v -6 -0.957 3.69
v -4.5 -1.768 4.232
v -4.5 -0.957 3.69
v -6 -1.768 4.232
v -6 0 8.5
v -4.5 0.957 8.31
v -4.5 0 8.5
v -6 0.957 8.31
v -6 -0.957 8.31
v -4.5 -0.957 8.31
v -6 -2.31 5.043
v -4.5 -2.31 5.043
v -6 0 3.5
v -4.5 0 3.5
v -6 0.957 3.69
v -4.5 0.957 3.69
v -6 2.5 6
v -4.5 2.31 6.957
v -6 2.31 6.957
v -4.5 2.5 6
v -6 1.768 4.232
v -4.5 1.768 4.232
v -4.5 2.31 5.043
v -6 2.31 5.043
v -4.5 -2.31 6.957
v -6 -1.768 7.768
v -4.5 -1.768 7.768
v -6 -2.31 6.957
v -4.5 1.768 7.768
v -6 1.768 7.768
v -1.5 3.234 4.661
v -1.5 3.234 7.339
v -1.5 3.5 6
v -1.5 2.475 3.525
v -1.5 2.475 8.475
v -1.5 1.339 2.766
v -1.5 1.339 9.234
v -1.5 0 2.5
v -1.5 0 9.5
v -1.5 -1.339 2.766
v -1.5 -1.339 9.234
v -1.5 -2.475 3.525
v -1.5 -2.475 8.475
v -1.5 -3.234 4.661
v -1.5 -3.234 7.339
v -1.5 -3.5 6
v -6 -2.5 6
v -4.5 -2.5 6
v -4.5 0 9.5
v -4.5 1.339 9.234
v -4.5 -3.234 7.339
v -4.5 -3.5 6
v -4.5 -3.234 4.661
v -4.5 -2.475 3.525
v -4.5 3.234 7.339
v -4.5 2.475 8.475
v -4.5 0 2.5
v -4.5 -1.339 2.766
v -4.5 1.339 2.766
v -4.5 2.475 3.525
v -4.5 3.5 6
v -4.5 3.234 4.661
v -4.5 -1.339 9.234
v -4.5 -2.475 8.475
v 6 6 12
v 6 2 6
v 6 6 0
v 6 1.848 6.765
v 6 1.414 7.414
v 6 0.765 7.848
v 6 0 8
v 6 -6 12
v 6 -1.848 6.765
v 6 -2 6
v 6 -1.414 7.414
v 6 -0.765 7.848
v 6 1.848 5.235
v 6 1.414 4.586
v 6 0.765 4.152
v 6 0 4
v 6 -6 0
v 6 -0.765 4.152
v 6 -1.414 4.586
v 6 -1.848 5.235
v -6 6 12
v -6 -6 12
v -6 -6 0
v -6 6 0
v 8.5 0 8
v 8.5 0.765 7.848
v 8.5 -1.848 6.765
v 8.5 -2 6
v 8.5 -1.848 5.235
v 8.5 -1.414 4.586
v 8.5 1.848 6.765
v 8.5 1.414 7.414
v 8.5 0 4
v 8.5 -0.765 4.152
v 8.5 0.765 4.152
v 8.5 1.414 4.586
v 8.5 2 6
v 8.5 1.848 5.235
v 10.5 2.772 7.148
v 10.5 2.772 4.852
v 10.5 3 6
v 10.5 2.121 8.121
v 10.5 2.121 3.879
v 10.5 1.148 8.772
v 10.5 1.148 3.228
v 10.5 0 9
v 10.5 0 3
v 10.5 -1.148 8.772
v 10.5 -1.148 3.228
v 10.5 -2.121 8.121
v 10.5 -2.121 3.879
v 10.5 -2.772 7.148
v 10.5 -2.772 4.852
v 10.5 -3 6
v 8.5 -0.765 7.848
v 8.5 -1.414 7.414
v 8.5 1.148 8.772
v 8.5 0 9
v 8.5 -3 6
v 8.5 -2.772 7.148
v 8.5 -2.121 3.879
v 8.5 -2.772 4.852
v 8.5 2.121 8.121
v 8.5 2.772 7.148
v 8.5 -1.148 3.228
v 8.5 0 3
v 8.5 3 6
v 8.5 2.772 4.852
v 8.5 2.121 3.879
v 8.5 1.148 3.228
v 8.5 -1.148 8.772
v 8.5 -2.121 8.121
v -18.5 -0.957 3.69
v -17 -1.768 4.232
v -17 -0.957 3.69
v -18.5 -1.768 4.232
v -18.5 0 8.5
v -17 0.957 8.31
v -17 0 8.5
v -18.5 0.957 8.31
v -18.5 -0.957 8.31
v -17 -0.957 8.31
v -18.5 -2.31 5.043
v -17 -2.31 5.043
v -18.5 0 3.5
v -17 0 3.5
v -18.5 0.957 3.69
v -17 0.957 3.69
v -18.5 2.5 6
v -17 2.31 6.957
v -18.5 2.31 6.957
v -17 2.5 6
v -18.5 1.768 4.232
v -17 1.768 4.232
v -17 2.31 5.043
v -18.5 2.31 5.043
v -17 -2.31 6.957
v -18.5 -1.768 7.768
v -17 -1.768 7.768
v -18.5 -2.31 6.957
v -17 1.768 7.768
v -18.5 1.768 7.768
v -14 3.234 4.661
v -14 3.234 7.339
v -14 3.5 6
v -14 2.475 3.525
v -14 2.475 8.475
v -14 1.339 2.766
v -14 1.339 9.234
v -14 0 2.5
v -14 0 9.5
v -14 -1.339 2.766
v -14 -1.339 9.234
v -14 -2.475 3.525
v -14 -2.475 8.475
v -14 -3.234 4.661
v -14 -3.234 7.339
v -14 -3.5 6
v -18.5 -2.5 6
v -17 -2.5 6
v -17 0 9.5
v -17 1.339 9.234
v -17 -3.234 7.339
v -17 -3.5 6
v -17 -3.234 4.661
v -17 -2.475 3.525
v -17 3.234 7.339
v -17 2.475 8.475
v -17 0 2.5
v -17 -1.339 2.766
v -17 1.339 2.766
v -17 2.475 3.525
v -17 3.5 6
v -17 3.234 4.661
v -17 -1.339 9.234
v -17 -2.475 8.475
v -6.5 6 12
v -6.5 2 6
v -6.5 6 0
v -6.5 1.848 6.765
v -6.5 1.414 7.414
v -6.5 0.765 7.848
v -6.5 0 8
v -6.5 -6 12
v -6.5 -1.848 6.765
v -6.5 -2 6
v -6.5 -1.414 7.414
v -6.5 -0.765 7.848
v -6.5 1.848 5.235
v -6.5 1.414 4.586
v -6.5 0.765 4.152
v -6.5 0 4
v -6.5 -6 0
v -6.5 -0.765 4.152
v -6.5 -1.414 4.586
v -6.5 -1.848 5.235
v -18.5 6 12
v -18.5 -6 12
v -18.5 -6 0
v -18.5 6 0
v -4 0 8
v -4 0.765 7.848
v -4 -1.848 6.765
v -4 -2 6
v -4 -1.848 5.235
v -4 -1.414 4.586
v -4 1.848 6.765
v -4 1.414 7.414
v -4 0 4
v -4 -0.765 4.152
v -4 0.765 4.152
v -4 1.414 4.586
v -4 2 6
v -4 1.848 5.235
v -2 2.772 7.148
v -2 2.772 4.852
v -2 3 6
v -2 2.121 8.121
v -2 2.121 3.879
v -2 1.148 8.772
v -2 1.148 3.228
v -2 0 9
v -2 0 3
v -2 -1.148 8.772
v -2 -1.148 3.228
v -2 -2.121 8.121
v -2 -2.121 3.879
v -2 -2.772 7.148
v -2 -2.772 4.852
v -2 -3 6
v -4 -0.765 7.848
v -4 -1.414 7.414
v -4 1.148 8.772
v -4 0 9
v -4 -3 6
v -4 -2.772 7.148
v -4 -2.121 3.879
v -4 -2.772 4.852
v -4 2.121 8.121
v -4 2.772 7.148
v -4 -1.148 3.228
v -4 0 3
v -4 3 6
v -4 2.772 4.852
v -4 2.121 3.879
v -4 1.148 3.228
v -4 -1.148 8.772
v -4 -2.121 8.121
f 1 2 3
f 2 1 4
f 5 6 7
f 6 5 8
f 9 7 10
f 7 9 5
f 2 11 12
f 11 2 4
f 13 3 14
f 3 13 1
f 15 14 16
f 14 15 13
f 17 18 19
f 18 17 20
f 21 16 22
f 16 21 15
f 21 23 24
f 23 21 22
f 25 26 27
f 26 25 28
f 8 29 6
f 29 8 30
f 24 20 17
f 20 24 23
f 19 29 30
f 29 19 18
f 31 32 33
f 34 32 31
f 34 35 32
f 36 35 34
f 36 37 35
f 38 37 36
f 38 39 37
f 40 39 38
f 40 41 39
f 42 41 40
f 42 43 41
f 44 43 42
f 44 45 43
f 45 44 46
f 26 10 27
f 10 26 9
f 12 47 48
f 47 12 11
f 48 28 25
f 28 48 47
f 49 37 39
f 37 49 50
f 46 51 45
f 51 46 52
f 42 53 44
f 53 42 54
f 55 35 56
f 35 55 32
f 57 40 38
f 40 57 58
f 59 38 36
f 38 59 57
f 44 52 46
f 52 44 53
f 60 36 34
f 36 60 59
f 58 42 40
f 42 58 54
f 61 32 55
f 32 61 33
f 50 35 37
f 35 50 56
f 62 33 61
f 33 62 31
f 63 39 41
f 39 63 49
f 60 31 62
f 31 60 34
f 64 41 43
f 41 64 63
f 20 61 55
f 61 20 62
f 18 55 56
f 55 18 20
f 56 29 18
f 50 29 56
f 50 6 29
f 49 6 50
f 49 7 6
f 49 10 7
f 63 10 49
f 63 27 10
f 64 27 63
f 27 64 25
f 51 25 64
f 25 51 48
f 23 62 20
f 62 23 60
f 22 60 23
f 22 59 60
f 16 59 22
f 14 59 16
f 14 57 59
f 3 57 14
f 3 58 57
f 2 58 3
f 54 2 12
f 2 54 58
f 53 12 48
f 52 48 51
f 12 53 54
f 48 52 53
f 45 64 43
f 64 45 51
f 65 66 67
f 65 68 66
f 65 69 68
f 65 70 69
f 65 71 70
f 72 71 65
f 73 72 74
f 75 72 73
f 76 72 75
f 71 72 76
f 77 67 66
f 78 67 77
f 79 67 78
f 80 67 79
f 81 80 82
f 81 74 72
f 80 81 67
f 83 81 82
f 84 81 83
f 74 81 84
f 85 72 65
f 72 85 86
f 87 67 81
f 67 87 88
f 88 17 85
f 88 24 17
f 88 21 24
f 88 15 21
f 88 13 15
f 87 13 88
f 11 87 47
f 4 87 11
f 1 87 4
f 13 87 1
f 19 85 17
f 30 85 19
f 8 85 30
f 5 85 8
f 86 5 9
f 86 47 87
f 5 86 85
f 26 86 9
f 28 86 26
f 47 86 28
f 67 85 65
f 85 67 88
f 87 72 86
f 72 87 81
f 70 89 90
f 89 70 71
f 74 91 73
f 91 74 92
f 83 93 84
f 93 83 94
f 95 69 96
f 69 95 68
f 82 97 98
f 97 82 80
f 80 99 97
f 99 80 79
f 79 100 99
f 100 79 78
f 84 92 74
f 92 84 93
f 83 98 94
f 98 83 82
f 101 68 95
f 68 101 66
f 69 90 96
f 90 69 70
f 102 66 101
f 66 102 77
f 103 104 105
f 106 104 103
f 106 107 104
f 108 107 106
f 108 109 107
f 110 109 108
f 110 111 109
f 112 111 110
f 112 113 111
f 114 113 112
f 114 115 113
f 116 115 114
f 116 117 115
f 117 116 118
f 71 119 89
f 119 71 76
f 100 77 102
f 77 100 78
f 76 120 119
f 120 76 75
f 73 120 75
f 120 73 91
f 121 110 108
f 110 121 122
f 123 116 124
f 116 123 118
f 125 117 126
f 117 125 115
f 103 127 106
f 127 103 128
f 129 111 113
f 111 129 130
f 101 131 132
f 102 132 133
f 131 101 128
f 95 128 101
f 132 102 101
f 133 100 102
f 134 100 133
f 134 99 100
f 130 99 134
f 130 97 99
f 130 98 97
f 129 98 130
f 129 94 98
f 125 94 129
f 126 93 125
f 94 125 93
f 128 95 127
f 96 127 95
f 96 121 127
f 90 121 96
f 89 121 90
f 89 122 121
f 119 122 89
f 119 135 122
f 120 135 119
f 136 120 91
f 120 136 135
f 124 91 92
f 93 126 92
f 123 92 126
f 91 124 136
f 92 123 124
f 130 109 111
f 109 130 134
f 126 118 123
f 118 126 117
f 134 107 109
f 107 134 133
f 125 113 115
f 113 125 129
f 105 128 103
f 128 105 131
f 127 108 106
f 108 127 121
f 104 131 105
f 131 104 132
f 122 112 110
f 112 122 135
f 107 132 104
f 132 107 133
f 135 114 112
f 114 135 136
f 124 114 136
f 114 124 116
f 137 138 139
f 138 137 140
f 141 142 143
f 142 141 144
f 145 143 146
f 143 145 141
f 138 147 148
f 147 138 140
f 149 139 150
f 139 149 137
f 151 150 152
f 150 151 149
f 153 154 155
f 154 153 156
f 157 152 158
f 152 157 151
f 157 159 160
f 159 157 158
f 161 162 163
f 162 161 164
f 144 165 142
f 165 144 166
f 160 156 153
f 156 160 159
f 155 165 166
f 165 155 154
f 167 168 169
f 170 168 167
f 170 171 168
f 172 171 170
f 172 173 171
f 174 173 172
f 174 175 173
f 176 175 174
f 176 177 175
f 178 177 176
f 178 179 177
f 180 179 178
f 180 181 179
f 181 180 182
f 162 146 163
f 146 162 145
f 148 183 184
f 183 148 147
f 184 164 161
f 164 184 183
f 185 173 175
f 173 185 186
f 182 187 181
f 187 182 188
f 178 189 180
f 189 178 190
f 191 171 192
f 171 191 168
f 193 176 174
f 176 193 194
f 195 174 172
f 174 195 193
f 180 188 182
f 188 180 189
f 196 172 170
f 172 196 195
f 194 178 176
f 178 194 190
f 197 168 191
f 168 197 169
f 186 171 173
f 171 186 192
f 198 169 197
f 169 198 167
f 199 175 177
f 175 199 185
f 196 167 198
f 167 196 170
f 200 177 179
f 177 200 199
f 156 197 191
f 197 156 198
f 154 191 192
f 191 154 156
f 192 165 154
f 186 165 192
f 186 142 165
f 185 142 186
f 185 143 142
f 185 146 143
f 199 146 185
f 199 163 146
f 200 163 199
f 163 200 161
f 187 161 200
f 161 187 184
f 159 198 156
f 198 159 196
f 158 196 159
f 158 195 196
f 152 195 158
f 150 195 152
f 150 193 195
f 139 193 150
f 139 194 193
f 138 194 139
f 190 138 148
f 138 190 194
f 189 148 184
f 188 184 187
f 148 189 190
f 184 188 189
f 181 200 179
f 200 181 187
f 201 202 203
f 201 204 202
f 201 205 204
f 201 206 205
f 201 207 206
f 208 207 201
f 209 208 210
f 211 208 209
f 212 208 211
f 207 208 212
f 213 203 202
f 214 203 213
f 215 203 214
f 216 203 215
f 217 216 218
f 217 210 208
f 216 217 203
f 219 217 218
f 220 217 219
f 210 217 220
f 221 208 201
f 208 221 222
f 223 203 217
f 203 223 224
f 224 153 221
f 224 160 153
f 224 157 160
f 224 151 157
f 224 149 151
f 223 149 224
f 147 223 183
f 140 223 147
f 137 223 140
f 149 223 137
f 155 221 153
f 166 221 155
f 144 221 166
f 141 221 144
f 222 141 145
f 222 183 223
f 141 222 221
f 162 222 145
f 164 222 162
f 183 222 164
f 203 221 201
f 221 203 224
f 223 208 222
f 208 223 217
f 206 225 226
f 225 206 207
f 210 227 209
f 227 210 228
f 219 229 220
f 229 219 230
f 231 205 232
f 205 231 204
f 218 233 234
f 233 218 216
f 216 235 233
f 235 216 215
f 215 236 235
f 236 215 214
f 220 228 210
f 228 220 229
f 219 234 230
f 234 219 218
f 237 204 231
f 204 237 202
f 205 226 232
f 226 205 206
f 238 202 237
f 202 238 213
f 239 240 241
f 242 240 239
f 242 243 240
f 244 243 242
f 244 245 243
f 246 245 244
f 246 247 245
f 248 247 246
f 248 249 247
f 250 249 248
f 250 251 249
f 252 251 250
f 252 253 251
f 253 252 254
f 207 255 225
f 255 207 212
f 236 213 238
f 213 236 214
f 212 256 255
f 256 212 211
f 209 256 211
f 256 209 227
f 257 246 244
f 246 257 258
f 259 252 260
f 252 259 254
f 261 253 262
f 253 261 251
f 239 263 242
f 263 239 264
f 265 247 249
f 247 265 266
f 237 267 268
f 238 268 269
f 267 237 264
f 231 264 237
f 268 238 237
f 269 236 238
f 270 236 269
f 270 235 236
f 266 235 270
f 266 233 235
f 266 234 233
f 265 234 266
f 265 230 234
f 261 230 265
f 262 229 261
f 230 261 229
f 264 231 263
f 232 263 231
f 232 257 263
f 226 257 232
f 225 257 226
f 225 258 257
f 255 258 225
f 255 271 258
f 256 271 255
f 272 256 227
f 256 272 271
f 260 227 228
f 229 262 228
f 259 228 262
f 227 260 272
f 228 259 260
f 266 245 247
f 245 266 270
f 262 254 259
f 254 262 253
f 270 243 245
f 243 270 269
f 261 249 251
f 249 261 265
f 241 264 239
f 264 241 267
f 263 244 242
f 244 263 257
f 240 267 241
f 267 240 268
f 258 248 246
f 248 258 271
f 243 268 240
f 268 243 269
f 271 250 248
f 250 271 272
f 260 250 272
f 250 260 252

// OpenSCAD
size=12;
pegLength=4;
pegD=6;
pegD2=4;

slack = 0.5;
gap = 0.5;
pegFN=16;

module peg()
{
    // Rod
    translate( [ 0, size/2, size/2 ] ) rotate( [0,90,0] ) cylinder( d=pegD2, h=pegLength + gap, $fn=pegFN );
    // Holding peg
    translate( [ 0 + pegLength/2 + gap, size/2, size/2 ] ) rotate( [0,90,0] ) cylinder( d=pegD, h=pegLength/2, $fn=pegFN );
}

module hole()
{
    // Hole for Rod
    translate( [ -1, size/2, size/2 ] ) rotate( [0,90,0] ) cylinder( d=pegD2 + slack*2, h=pegLength+slack+1, $fn=pegFN );
    // Hole for holding peg.
    translate( [ pegLength/2 - slack, size/2, size/2 ] ) rotate( [0,90,0] ) cylinder( d=pegD + slack*2, h=pegLength/2 + slack*2, $fn=pegFN );
}

module straight()
{
    translate( [-size/2, -size/2, 0] ) {
        difference() {
            cube( [size,size,size] );
            hole();
        }
        translate([size,0,0]) peg();
    }
}


module corner()
{
    translate( [-size/2, -size/2, 0] ) {
        difference() {
            cube( [size,size,size] );
            hole();
        }
        #translate([size,size,0]) rotate( [0,0,90] ) peg();
    }
}

module position( x, y, angle )
{
    translate( [x * (size + gap), y * (size +gap),0 ] )
    rotate( [0,0,angle] )
    children();
}

module inspect()
{
    intersection() {
        children();
        translate( [-50,-0.5,-50] ) cube( [100,1,100] );
    }
}

module test()
{
    straight();
    position( -1,0, 0 ) straight();
    //position( 1,0, 0 ) corner();
}

//inspect()
test();
